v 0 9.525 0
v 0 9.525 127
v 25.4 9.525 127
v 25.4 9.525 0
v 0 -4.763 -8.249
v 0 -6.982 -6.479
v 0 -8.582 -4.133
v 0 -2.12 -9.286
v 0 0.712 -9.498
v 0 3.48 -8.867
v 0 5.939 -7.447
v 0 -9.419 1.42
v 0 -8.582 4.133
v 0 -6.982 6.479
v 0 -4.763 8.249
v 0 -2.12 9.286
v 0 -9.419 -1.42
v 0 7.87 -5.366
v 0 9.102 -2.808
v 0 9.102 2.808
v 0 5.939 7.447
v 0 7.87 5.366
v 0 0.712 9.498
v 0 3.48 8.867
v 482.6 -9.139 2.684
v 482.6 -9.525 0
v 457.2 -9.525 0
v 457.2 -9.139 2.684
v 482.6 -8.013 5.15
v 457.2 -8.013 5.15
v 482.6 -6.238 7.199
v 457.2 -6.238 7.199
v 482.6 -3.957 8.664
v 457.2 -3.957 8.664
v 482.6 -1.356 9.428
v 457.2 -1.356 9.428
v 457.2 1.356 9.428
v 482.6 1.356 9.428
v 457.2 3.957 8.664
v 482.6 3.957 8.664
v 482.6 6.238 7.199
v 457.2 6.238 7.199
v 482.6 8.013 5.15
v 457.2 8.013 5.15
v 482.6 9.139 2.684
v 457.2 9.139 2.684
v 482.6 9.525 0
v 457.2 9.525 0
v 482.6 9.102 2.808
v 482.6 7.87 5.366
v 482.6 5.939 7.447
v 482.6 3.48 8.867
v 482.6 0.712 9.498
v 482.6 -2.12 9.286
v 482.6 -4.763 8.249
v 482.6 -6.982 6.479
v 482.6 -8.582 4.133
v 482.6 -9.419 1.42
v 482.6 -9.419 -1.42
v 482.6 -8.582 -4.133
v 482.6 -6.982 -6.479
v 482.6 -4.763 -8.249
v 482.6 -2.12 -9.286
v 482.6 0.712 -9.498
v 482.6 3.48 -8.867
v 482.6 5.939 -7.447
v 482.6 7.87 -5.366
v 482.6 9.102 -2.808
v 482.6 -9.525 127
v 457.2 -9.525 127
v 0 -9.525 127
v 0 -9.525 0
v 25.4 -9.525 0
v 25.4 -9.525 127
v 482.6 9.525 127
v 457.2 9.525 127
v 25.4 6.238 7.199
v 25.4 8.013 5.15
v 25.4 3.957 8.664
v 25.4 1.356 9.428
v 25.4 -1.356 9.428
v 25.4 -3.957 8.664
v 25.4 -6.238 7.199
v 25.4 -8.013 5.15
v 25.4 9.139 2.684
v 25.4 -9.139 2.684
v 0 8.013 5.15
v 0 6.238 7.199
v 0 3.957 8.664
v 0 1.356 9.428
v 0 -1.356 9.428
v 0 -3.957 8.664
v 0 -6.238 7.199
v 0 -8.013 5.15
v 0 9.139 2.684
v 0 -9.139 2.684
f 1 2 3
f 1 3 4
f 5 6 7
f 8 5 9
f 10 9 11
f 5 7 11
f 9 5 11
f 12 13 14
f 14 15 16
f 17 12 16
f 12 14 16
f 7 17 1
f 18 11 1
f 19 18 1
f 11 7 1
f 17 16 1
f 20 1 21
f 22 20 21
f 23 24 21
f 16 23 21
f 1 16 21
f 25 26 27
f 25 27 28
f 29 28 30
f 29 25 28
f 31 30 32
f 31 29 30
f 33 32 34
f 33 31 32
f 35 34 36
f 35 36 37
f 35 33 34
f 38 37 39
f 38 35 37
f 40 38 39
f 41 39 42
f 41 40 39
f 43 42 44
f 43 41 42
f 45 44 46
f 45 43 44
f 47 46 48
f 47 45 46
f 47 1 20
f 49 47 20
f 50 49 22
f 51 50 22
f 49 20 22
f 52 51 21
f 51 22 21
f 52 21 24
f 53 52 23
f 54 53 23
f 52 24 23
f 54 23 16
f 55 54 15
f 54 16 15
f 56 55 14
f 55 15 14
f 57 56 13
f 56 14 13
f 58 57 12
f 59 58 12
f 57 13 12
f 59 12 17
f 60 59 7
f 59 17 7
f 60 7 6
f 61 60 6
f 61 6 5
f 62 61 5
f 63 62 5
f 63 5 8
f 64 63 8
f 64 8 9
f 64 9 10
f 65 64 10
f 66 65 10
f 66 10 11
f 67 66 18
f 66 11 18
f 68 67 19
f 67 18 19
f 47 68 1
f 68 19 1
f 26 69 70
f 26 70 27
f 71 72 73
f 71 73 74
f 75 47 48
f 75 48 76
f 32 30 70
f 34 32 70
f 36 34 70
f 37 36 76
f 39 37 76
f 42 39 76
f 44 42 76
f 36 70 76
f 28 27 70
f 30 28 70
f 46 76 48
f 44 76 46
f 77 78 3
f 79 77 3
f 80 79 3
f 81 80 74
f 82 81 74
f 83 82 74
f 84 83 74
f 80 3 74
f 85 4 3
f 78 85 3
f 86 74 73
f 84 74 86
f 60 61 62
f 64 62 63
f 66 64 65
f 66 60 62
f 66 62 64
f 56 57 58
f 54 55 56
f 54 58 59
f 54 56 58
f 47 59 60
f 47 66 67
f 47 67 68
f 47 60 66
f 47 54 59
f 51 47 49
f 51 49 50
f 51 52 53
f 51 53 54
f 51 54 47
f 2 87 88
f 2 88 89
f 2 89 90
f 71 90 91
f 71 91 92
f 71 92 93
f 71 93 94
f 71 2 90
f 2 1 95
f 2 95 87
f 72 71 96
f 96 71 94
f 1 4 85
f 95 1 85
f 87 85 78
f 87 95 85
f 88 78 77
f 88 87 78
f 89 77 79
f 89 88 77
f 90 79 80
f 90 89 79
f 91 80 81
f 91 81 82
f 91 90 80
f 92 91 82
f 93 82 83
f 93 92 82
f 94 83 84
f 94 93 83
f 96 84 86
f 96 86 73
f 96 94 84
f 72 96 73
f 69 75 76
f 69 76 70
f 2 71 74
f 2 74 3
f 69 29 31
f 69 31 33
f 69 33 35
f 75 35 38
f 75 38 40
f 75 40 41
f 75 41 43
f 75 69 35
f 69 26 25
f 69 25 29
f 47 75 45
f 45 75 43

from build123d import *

# Parameters (mm, degrees)
F0_R     = 9.525
F1_DEPTH = 482.6
F3_DEPTH = 25.4
F5_DEPTH = 25.4


with BuildPart() as f1:
    # F0 (on Right) → F1 (new body)
    with BuildSketch(Plane.YZ):
        Circle(F0_R)
    extrude(amount=F1_DEPTH)


with BuildPart() as f3:
    # F2 (on face) → F3 (new body)
    with BuildSketch(Plane(origin=(0, 0, 0), x_dir=(0, -1, 0), z_dir=(-1, 0, 0))):
        with BuildLine():
            Line((-9.525, 127), (-9.525, 0))
            ThreePointArc((-9.525, 0), (0, 9.525), (9.525, 0))
            Line((9.525, 0), (9.525, 127))
            Line((9.525, 127), (-9.525, 127))
        make_face()
    extrude(amount=-F3_DEPTH)


with BuildPart() as f5:
    # F4 (on face) → F5 (new body)
    with BuildSketch(Plane.YZ.offset(482.6)):
        with BuildLine():
            Line((-9.525, 127), (-9.525, 0))
            ThreePointArc((-9.525, 0), (0, 9.525), (9.525, 0))
            Line((9.525, 0), (9.525, 127))
            Line((9.525, 127), (-9.525, 127))
        make_face()
    extrude(amount=-F5_DEPTH)


solid = Compound([f1.part, f3.part, f5.part])
